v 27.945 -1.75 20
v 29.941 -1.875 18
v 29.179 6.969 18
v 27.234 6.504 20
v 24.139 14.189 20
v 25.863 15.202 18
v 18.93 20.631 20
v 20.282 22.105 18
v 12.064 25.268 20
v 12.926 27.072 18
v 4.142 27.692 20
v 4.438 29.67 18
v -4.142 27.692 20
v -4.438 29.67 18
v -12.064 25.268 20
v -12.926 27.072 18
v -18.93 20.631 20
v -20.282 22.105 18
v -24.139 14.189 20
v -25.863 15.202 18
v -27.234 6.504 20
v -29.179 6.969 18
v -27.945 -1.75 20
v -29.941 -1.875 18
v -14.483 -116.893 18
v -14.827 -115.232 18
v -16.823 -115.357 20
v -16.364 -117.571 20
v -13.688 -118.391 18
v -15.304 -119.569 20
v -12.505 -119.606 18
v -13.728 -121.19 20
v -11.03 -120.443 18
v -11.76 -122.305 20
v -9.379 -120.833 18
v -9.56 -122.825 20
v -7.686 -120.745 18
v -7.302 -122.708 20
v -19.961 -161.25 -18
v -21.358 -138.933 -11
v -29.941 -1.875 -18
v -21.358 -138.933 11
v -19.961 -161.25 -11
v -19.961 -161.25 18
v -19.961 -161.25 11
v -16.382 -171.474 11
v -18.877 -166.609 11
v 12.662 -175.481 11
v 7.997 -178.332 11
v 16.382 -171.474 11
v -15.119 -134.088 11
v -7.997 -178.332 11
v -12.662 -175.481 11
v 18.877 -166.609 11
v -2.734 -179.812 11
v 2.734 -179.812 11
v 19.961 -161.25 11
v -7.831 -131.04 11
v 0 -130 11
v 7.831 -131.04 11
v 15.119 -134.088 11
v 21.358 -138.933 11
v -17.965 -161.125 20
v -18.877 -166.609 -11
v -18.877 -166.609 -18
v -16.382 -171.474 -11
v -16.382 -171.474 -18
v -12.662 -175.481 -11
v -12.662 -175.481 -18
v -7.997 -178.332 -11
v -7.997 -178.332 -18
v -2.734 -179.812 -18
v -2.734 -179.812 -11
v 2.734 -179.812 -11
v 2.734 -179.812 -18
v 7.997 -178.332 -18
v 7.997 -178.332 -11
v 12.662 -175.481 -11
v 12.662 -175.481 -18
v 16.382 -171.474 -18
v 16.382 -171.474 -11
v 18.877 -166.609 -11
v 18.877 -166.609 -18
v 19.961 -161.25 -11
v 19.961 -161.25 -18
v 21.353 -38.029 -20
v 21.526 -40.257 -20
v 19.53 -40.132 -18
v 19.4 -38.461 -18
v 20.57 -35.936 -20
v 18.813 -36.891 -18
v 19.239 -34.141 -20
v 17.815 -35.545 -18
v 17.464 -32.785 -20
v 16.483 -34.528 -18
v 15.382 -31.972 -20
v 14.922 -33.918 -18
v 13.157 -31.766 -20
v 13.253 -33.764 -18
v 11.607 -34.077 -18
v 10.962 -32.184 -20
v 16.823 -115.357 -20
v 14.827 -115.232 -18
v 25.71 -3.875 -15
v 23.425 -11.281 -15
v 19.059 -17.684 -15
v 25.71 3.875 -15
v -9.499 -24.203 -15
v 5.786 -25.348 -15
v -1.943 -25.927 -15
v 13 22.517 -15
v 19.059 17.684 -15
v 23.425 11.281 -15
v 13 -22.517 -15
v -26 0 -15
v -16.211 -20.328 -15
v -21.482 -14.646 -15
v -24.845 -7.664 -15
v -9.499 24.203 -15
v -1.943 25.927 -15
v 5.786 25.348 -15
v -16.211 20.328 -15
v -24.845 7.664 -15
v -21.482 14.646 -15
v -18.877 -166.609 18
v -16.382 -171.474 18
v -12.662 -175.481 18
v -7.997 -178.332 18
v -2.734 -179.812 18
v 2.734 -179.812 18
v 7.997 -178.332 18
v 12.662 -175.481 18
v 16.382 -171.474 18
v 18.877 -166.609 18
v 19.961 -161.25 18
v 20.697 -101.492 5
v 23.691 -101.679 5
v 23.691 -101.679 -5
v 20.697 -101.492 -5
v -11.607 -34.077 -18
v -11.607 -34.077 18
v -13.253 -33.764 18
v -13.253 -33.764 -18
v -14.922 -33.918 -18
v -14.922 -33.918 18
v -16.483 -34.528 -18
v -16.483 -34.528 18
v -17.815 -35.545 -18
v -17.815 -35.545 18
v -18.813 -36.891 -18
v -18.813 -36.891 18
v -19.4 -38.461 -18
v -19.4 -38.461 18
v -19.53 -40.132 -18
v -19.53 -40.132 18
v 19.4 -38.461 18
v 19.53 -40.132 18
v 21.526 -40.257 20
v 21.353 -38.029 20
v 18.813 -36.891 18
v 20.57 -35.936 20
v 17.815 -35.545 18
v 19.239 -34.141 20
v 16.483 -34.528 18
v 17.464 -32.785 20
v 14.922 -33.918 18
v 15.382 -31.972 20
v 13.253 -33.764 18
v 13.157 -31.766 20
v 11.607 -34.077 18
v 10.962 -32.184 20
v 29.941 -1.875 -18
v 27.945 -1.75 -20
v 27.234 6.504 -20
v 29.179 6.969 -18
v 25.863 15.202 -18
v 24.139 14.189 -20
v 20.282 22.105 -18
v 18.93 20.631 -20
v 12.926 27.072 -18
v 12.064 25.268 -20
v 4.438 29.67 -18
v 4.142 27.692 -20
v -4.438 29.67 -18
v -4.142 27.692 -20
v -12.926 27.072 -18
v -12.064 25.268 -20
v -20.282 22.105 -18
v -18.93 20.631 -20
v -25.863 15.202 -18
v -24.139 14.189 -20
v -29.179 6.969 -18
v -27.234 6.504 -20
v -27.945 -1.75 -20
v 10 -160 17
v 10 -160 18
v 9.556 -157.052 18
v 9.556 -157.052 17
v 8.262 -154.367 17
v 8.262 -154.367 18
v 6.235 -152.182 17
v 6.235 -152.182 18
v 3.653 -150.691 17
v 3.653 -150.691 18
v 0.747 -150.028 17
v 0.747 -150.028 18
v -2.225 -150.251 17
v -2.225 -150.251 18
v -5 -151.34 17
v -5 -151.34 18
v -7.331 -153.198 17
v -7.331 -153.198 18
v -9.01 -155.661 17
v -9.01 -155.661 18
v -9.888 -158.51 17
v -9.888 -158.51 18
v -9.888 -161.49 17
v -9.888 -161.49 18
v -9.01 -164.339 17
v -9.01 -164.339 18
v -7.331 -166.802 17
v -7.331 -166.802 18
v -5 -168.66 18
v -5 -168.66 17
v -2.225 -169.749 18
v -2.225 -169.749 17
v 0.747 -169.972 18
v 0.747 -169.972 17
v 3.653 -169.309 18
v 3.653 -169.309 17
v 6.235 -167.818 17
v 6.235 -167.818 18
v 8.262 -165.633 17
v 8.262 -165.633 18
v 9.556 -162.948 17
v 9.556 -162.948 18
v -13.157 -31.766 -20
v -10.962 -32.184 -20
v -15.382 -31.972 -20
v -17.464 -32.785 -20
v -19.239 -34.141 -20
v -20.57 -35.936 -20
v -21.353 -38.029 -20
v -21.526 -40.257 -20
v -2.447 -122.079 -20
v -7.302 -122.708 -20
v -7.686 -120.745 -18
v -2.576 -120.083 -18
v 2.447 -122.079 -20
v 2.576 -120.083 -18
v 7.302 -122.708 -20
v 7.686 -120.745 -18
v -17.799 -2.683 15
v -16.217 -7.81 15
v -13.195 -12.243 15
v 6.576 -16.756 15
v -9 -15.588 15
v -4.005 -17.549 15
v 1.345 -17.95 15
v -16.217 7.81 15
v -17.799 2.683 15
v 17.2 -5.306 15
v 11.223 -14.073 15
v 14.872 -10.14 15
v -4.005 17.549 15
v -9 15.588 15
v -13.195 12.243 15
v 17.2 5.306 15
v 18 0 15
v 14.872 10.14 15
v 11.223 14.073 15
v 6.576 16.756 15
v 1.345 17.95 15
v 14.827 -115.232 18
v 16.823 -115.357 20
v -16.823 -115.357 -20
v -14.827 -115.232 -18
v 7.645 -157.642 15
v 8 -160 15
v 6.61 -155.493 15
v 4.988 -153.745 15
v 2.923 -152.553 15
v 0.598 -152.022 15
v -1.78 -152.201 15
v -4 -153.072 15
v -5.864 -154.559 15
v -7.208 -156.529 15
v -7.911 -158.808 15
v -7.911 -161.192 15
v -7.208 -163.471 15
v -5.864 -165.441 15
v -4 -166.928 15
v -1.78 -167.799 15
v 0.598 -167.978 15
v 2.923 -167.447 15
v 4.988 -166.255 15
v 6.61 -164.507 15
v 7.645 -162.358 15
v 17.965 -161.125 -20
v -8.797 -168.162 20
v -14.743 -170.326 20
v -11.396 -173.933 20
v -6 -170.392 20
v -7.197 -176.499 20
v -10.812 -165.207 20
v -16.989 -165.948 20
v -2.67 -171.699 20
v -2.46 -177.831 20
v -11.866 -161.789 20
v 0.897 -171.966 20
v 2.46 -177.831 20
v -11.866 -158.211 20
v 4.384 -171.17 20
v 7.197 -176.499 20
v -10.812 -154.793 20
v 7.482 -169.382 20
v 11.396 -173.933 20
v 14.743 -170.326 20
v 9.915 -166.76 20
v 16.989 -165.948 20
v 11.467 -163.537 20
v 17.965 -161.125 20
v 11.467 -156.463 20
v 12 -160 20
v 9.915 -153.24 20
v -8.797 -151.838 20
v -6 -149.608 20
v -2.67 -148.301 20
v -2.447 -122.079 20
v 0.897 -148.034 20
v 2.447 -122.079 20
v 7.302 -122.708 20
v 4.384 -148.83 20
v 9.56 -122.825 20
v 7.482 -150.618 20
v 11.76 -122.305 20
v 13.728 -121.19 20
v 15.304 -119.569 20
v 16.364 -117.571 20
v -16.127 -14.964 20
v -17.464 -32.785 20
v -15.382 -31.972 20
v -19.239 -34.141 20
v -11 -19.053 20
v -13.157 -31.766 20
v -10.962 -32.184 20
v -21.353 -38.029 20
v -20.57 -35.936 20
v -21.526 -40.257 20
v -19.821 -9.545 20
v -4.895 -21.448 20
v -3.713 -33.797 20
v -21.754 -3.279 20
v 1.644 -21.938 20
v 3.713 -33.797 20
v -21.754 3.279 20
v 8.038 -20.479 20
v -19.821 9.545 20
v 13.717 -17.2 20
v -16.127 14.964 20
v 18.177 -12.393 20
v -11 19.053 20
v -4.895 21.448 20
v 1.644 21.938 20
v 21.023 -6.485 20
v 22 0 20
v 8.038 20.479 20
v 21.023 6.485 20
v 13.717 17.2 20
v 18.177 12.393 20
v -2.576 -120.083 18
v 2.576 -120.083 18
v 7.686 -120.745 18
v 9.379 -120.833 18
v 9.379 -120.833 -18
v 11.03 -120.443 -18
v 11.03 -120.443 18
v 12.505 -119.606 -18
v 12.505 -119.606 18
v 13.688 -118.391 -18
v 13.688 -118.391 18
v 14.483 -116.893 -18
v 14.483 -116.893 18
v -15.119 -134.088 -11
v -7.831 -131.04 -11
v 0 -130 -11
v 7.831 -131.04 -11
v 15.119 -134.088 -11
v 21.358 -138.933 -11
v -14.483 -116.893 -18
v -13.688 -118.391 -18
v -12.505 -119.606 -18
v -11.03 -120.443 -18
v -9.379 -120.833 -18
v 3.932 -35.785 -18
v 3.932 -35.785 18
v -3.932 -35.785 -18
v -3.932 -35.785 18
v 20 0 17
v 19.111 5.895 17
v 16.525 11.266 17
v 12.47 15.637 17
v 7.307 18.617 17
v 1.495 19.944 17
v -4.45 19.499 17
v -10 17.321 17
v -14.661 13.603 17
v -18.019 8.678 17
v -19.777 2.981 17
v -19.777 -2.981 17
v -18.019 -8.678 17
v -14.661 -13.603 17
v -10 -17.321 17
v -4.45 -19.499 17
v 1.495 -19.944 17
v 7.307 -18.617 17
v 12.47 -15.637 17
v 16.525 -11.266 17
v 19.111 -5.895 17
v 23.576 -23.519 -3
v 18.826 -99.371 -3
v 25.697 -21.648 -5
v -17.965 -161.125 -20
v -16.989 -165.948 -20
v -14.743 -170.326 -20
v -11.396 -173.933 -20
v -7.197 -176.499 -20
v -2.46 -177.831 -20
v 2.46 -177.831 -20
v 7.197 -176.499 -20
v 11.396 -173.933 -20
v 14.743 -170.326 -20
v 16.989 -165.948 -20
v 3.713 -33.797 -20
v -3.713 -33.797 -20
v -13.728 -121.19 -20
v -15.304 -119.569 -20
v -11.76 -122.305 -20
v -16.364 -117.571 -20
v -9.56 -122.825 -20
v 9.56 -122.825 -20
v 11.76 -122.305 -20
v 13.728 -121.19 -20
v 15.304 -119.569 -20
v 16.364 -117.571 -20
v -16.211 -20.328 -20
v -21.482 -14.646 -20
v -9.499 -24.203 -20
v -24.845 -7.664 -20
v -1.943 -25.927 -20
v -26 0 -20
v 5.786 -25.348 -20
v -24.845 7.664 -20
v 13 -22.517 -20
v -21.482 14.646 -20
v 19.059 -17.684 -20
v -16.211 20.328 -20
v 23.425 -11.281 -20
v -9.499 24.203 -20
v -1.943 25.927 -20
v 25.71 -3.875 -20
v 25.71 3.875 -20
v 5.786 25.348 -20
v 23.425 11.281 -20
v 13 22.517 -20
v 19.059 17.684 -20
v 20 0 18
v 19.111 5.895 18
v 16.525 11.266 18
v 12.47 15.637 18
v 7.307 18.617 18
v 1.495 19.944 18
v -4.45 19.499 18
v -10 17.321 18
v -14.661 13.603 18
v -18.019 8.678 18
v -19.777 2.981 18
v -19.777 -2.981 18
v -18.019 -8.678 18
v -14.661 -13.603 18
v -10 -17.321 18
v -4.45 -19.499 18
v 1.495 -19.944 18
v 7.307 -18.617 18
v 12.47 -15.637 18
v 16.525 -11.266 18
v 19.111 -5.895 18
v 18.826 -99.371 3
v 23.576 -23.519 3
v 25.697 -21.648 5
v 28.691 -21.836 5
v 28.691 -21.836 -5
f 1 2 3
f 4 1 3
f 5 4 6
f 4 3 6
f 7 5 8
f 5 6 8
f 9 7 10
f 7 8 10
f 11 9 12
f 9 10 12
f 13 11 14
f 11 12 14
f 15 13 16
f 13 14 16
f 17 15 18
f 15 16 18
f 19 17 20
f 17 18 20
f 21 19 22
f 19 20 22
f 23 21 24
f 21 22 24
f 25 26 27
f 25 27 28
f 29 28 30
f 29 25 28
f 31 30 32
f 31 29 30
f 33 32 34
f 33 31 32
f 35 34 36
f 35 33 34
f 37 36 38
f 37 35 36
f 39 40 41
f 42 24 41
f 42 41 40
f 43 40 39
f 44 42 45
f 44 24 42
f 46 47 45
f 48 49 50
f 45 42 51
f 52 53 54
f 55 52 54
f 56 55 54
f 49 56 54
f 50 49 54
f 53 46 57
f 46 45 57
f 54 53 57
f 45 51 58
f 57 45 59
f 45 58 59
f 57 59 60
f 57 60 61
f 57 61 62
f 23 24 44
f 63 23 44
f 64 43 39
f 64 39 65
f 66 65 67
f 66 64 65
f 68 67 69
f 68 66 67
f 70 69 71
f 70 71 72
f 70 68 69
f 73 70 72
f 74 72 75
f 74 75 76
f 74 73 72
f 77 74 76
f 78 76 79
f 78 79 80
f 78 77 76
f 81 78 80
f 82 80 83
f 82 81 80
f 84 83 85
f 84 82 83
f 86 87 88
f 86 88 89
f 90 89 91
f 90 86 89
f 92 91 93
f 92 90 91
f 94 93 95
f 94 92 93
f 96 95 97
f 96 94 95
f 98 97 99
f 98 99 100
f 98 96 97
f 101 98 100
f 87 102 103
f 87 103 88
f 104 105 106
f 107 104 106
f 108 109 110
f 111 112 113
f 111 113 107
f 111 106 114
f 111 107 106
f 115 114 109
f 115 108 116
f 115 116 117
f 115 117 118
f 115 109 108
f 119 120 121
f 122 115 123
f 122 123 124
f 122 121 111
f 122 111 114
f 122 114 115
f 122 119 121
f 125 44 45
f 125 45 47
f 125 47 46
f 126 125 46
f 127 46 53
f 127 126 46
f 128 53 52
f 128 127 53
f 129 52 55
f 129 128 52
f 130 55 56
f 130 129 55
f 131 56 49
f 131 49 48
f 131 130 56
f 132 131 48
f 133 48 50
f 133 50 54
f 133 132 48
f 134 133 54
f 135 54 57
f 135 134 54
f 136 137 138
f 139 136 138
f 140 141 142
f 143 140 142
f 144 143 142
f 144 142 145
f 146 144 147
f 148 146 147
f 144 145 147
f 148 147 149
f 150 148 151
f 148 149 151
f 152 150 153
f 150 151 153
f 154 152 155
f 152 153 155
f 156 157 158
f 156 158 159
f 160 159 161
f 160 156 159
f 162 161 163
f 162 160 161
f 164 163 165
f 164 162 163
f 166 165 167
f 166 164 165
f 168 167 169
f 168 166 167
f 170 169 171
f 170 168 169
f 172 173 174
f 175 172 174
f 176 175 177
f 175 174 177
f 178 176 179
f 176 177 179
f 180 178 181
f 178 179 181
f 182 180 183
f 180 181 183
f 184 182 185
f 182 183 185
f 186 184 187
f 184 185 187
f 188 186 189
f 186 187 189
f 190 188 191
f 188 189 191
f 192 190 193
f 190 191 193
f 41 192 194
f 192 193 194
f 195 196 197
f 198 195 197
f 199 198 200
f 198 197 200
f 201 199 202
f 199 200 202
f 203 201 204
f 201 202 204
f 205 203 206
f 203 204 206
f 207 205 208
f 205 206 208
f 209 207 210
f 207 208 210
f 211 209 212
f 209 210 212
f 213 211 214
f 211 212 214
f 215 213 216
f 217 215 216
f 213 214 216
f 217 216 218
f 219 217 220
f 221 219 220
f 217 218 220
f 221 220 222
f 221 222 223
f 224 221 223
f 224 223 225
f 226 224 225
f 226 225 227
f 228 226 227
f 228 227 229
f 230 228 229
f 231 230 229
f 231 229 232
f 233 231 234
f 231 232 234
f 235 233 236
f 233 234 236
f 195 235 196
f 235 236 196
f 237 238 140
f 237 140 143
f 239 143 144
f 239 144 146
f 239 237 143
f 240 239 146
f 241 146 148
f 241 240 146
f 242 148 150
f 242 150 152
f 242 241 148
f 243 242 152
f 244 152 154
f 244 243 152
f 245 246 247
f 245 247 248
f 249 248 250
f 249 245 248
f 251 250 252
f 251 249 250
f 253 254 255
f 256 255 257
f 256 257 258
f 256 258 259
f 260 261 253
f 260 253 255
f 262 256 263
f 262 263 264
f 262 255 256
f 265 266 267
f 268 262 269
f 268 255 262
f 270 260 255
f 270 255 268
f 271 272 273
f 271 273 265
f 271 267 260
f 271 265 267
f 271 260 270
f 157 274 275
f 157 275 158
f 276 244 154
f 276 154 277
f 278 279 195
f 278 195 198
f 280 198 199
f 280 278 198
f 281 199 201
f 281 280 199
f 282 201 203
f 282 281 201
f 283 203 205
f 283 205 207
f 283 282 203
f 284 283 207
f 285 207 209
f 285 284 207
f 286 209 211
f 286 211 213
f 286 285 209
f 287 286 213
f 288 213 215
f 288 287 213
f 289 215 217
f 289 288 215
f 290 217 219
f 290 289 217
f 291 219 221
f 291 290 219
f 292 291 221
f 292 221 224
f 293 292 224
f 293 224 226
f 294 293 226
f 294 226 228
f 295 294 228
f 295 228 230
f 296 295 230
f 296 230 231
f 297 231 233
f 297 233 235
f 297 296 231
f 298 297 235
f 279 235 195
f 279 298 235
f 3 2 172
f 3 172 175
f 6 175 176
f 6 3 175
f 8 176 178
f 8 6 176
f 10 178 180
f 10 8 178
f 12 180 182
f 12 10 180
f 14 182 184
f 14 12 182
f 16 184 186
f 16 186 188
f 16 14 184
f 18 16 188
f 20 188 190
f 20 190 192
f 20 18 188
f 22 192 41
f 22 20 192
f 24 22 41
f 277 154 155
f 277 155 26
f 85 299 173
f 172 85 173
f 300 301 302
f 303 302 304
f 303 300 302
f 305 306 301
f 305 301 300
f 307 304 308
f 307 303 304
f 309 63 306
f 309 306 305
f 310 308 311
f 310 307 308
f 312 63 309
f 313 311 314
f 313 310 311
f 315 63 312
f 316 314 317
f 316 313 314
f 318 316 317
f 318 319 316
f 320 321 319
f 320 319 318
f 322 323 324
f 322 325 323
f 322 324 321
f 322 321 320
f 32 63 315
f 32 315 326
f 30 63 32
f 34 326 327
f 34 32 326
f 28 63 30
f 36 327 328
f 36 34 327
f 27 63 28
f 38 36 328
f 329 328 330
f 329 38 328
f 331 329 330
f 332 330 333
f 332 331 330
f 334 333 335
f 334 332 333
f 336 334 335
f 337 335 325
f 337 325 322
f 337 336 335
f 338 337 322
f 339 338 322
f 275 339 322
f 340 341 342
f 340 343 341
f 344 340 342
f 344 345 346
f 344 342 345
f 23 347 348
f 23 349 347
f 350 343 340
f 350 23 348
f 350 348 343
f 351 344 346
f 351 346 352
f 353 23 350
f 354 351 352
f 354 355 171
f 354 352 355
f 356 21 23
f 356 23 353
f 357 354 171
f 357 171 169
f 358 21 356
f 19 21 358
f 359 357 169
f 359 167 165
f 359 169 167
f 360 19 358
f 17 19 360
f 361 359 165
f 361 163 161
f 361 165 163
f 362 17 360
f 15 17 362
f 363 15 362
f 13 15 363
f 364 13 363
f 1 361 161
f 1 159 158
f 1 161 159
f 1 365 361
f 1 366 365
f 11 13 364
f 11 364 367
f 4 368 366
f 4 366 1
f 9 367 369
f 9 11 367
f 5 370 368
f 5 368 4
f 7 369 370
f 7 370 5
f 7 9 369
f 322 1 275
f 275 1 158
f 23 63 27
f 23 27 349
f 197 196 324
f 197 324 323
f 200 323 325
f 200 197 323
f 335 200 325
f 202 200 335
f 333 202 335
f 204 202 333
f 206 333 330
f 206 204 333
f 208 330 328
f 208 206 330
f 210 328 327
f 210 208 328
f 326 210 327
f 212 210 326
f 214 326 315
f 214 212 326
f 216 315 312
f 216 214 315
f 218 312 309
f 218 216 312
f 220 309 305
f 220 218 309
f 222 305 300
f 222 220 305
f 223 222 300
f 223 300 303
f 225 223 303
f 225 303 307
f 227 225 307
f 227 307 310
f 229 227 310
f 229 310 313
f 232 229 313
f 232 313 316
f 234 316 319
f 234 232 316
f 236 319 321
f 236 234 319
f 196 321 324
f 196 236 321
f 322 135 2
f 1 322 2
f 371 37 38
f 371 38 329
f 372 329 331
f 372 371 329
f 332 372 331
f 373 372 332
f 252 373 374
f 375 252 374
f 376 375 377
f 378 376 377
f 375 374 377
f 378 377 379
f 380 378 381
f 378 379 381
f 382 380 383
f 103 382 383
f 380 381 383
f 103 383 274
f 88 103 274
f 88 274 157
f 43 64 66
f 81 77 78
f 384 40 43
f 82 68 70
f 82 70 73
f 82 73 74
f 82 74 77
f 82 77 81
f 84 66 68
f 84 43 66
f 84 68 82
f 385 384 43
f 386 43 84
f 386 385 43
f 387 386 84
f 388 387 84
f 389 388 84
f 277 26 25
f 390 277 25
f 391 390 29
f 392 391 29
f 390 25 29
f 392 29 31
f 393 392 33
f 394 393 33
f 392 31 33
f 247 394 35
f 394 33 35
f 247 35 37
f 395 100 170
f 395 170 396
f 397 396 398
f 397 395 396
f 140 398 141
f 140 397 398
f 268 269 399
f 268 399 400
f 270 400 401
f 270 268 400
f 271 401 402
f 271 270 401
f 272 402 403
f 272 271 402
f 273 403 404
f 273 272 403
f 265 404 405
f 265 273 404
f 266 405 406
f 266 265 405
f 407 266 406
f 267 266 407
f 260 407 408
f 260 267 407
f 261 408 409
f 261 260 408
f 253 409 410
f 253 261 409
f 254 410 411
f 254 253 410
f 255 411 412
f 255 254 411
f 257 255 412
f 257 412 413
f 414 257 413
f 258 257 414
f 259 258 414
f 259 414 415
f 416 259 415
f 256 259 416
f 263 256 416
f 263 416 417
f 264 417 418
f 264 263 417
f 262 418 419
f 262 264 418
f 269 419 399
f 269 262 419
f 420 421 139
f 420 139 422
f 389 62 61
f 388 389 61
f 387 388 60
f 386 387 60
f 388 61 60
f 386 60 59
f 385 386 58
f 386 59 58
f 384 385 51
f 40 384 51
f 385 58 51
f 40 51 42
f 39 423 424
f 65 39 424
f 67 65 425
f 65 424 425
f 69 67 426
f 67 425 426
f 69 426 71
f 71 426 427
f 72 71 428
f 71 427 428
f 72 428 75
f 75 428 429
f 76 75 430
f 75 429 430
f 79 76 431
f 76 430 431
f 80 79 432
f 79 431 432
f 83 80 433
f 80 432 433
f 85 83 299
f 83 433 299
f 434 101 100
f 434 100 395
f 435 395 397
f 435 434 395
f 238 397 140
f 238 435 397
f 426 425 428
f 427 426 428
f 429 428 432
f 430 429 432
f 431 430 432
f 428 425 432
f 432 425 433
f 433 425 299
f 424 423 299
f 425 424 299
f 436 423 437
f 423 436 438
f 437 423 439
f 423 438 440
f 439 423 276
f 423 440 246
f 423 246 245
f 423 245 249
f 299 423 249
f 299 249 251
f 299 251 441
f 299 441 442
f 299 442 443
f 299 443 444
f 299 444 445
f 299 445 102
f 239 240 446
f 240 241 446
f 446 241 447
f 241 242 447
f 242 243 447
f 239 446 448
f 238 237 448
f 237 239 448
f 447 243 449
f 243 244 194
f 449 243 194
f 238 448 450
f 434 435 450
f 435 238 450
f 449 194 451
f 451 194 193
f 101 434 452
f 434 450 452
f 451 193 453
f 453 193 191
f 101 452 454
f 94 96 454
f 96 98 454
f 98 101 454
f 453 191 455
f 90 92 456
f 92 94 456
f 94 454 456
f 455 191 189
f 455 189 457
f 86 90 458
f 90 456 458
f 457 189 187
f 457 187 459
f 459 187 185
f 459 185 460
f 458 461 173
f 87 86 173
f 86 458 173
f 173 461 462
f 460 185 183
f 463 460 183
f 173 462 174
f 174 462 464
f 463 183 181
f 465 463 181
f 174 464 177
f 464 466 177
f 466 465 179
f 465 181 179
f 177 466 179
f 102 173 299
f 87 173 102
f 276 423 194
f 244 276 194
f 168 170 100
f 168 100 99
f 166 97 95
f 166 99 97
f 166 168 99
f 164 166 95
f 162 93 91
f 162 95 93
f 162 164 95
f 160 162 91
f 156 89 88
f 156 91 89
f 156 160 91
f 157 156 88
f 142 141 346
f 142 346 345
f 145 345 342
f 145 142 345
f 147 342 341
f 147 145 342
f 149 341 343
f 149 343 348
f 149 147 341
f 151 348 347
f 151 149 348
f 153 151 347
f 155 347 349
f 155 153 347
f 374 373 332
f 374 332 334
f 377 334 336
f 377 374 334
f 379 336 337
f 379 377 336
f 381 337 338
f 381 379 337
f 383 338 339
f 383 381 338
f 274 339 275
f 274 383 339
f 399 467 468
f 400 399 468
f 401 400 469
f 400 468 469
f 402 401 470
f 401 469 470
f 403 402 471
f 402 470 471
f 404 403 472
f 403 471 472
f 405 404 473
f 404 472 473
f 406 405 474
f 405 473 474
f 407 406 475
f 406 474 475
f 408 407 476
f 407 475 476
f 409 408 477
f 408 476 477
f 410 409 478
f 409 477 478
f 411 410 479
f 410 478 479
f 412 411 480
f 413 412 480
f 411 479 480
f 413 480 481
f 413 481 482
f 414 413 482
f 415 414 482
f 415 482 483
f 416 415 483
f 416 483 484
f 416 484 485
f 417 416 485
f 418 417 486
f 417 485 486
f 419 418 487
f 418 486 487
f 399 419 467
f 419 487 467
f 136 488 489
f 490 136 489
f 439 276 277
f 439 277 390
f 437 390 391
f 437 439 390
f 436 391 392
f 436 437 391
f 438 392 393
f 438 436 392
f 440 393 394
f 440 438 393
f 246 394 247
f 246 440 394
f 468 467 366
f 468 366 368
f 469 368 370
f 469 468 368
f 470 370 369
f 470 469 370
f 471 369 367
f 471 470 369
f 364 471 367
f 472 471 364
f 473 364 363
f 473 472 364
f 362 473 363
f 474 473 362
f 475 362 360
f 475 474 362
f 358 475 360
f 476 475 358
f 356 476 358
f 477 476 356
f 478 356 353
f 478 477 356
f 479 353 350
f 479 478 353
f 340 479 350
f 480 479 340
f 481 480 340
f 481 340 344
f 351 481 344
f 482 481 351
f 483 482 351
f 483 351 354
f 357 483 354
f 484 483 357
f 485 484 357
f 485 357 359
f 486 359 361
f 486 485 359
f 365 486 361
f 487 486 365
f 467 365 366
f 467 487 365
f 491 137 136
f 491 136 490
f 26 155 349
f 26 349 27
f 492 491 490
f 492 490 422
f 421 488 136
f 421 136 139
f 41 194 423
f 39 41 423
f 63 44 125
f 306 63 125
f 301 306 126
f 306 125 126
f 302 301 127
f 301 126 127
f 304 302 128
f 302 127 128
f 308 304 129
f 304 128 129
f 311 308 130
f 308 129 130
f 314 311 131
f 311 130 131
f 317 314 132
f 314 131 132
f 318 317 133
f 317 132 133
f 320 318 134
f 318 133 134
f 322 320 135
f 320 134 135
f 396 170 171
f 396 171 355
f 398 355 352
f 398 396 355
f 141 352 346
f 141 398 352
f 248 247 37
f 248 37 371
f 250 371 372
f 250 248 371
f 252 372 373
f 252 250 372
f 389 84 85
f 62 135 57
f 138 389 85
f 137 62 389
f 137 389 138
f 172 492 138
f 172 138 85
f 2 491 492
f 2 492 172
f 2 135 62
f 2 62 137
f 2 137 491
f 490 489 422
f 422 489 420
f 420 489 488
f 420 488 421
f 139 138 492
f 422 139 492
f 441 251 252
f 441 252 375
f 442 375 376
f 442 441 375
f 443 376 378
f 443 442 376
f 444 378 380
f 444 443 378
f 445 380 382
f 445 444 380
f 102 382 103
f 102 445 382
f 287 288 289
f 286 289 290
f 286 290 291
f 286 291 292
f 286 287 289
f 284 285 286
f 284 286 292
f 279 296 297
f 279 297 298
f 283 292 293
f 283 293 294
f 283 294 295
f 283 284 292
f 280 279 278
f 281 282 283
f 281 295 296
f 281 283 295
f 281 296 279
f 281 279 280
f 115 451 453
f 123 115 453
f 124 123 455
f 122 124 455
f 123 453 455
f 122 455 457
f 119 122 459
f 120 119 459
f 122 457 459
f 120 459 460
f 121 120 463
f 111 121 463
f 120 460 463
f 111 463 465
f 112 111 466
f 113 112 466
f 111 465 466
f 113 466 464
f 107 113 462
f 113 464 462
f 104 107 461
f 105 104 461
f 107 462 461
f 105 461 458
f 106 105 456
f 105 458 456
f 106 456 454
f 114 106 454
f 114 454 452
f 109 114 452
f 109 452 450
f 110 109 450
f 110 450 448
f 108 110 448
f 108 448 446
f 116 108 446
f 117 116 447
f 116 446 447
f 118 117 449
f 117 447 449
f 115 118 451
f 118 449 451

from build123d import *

# Parameters (mm, degrees)
BOSS_EXTRUDE1_DEPTH = 20
SKETCH2_R           = 26
CUT_EXTRUDE1_DEPTH  = 5
SKETCH3_R           = 30
CUT_EXTRUDE2_DEPTH  = 11
CUT_EXTRUDE3_DEPTH  = 187.815416923
FILLET1_R           = 6
CHAMFER1_SIZE       = 2
SKETCH6_W           = 10
SKETCH6_H           = 80
CUT_EXTRUDE4_DEPTH  = 5
CHAMFER2_SIZE       = 2
SKETCH7_R           = 10
SKETCH7_R_2         = 20
CUT_EXTRUDE5_DEPTH  = 5
CHAMFER3_SIZE       = 2


with BuildPart() as part:
    # Sketch1 → Boss-Extrude1 (new, symmetric)
    with BuildSketch(Plane.XY):
        with BuildLine():
            Line((-29.941348918, -1.875), (-19.960899278, -161.25))
            ThreePointArc((-19.960899278, -161.25), (0, -180), (19.960899278, -161.25))
            Line((19.960899278, -161.25), (29.941348918, -1.875))
            ThreePointArc((29.941348918, -1.875), (0, 30), (-29.941348918, -1.875))
        make_face()
    extrude(amount=BOSS_EXTRUDE1_DEPTH, both=True)

    # Sketch2 → Cut-Extrude1 (cut)
    with BuildSketch(Plane(origin=(0, 0, -20), x_dir=(-1, 0, 0), z_dir=(0, 0, -1))):
        Circle(SKETCH2_R)
    extrude(amount=-CUT_EXTRUDE1_DEPTH, mode=Mode.SUBTRACT)

    # Sketch3 → Cut-Extrude2 (cut, symmetric)
    with BuildSketch(Plane.XY):
        with Locations((0, -160)):
            Circle(SKETCH3_R)
    extrude(amount=CUT_EXTRUDE2_DEPTH, both=True, mode=Mode.SUBTRACT)

    # Sketch4 → Cut-Extrude3 (cut, through all)
    with BuildSketch(Plane(origin=(0, 0, -20), x_dir=(-1, 0, 0), z_dir=(0, 0, -1))):
        with BuildLine():
            ThreePointArc((-20.17601335, -29.814903745), (0, -36), (20.17601335, -29.814903745))
            Line((20.17601335, -29.814903745), (14.361387571, -122.667031366))
            ThreePointArc((14.361387571, -122.667031366), (0, -120), (-14.361387571, -122.667031366))
            Line((-14.361387571, -122.667031366), (-20.17601335, -29.814903745))
        make_face()
    extrude(amount=-CUT_EXTRUDE3_DEPTH, mode=Mode.SUBTRACT)

    # Fillet1
    fillet1_edges = [part.edges().sort_by_distance(p)[0] for p in [
        (20.17601335, -29.814903745, 0),
        (-20.17601335, -29.814903745, 0),
        (-14.361387571, -122.667031366, 0),
        (14.361387571, -122.667031366, 0),
    ]]
    fillet(fillet1_edges, radius=FILLET1_R)

    # Chamfer1
    chamfer1_edges = [part.edges().sort_by_distance(p)[0] for p in [
        (0, -180, 20),
        (24.951124098, -81.5625, 20),
        (0, 30, 20),
        (24.951124098, -81.5625, -20),
        (0, -120, -20),
        (0, -120, 20),
        (17.178453178, -77.682101085, -20),
        (0, -180, -20),
        (17.178453178, -77.682101085, 20),
        (-17.178453178, -77.682101085, -20),
        (-17.178453178, -77.682101085, 20),
        (-24.951124098, -81.5625, -20),
        (0, -36, -20),
        (0, -36, 20),
        (12.505327982, -119.60645162, -20),
        (12.505327982, -119.60645162, 20),
        (-12.505327982, -119.60645162, -20),
        (-12.505327982, -119.60645162, 20),
        (17.184830058, -34.989739942, -20),
        (0, 30, -20),
        (17.184830058, -34.989739942, 20),
        (-17.184830058, -34.989739942, -20),
        (-17.184830058, -34.989739942, 20),
        (-24.951124098, -81.5625, 20),
    ]]
    chamfer(chamfer1_edges, length=CHAMFER1_SIZE)

    # Sketch6 → Cut-Extrude4 (cut)
    with BuildSketch(Plane(origin=(29.941348918, -1.875, 0), x_dir=(0, 0, -1), z_dir=(0.9980449639169572, -0.06249999999999988, 0))):
        with Locations((0, -60)):
            Rectangle(SKETCH6_W, SKETCH6_H)
    extrude(amount=-CUT_EXTRUDE4_DEPTH, mode=Mode.SUBTRACT)

    # Chamfer2
    chamfer2_edges = [part.edges().sort_by_distance(p)[0] for p in [
        (21.201124098, -61.445197835, 5),
        (23.701124098, -21.523399278, 0),
        (21.201124098, -61.445197835, -5),
        (18.701124098, -101.366996392, 0),
    ]]
    chamfer(chamfer2_edges, length=CHAMFER2_SIZE)

    # Sketch7 → Cut-Extrude5 (cut)
    with BuildSketch(Plane.XY.offset(20)):
        with Locations((0, -160)):
            Circle(SKETCH7_R)
        Circle(SKETCH7_R_2)
    extrude(amount=-CUT_EXTRUDE5_DEPTH, mode=Mode.SUBTRACT)

    # Chamfer3
    chamfer3_edges = [part.edges().sort_by_distance(p)[0] for p in [
        (-10, -160, 15),
        (-10, -160, 20),
        (-20, 0, 15),
        (-20, 0, 20),
    ]]
    chamfer(chamfer3_edges, length=CHAMFER3_SIZE)


solid = part.part
